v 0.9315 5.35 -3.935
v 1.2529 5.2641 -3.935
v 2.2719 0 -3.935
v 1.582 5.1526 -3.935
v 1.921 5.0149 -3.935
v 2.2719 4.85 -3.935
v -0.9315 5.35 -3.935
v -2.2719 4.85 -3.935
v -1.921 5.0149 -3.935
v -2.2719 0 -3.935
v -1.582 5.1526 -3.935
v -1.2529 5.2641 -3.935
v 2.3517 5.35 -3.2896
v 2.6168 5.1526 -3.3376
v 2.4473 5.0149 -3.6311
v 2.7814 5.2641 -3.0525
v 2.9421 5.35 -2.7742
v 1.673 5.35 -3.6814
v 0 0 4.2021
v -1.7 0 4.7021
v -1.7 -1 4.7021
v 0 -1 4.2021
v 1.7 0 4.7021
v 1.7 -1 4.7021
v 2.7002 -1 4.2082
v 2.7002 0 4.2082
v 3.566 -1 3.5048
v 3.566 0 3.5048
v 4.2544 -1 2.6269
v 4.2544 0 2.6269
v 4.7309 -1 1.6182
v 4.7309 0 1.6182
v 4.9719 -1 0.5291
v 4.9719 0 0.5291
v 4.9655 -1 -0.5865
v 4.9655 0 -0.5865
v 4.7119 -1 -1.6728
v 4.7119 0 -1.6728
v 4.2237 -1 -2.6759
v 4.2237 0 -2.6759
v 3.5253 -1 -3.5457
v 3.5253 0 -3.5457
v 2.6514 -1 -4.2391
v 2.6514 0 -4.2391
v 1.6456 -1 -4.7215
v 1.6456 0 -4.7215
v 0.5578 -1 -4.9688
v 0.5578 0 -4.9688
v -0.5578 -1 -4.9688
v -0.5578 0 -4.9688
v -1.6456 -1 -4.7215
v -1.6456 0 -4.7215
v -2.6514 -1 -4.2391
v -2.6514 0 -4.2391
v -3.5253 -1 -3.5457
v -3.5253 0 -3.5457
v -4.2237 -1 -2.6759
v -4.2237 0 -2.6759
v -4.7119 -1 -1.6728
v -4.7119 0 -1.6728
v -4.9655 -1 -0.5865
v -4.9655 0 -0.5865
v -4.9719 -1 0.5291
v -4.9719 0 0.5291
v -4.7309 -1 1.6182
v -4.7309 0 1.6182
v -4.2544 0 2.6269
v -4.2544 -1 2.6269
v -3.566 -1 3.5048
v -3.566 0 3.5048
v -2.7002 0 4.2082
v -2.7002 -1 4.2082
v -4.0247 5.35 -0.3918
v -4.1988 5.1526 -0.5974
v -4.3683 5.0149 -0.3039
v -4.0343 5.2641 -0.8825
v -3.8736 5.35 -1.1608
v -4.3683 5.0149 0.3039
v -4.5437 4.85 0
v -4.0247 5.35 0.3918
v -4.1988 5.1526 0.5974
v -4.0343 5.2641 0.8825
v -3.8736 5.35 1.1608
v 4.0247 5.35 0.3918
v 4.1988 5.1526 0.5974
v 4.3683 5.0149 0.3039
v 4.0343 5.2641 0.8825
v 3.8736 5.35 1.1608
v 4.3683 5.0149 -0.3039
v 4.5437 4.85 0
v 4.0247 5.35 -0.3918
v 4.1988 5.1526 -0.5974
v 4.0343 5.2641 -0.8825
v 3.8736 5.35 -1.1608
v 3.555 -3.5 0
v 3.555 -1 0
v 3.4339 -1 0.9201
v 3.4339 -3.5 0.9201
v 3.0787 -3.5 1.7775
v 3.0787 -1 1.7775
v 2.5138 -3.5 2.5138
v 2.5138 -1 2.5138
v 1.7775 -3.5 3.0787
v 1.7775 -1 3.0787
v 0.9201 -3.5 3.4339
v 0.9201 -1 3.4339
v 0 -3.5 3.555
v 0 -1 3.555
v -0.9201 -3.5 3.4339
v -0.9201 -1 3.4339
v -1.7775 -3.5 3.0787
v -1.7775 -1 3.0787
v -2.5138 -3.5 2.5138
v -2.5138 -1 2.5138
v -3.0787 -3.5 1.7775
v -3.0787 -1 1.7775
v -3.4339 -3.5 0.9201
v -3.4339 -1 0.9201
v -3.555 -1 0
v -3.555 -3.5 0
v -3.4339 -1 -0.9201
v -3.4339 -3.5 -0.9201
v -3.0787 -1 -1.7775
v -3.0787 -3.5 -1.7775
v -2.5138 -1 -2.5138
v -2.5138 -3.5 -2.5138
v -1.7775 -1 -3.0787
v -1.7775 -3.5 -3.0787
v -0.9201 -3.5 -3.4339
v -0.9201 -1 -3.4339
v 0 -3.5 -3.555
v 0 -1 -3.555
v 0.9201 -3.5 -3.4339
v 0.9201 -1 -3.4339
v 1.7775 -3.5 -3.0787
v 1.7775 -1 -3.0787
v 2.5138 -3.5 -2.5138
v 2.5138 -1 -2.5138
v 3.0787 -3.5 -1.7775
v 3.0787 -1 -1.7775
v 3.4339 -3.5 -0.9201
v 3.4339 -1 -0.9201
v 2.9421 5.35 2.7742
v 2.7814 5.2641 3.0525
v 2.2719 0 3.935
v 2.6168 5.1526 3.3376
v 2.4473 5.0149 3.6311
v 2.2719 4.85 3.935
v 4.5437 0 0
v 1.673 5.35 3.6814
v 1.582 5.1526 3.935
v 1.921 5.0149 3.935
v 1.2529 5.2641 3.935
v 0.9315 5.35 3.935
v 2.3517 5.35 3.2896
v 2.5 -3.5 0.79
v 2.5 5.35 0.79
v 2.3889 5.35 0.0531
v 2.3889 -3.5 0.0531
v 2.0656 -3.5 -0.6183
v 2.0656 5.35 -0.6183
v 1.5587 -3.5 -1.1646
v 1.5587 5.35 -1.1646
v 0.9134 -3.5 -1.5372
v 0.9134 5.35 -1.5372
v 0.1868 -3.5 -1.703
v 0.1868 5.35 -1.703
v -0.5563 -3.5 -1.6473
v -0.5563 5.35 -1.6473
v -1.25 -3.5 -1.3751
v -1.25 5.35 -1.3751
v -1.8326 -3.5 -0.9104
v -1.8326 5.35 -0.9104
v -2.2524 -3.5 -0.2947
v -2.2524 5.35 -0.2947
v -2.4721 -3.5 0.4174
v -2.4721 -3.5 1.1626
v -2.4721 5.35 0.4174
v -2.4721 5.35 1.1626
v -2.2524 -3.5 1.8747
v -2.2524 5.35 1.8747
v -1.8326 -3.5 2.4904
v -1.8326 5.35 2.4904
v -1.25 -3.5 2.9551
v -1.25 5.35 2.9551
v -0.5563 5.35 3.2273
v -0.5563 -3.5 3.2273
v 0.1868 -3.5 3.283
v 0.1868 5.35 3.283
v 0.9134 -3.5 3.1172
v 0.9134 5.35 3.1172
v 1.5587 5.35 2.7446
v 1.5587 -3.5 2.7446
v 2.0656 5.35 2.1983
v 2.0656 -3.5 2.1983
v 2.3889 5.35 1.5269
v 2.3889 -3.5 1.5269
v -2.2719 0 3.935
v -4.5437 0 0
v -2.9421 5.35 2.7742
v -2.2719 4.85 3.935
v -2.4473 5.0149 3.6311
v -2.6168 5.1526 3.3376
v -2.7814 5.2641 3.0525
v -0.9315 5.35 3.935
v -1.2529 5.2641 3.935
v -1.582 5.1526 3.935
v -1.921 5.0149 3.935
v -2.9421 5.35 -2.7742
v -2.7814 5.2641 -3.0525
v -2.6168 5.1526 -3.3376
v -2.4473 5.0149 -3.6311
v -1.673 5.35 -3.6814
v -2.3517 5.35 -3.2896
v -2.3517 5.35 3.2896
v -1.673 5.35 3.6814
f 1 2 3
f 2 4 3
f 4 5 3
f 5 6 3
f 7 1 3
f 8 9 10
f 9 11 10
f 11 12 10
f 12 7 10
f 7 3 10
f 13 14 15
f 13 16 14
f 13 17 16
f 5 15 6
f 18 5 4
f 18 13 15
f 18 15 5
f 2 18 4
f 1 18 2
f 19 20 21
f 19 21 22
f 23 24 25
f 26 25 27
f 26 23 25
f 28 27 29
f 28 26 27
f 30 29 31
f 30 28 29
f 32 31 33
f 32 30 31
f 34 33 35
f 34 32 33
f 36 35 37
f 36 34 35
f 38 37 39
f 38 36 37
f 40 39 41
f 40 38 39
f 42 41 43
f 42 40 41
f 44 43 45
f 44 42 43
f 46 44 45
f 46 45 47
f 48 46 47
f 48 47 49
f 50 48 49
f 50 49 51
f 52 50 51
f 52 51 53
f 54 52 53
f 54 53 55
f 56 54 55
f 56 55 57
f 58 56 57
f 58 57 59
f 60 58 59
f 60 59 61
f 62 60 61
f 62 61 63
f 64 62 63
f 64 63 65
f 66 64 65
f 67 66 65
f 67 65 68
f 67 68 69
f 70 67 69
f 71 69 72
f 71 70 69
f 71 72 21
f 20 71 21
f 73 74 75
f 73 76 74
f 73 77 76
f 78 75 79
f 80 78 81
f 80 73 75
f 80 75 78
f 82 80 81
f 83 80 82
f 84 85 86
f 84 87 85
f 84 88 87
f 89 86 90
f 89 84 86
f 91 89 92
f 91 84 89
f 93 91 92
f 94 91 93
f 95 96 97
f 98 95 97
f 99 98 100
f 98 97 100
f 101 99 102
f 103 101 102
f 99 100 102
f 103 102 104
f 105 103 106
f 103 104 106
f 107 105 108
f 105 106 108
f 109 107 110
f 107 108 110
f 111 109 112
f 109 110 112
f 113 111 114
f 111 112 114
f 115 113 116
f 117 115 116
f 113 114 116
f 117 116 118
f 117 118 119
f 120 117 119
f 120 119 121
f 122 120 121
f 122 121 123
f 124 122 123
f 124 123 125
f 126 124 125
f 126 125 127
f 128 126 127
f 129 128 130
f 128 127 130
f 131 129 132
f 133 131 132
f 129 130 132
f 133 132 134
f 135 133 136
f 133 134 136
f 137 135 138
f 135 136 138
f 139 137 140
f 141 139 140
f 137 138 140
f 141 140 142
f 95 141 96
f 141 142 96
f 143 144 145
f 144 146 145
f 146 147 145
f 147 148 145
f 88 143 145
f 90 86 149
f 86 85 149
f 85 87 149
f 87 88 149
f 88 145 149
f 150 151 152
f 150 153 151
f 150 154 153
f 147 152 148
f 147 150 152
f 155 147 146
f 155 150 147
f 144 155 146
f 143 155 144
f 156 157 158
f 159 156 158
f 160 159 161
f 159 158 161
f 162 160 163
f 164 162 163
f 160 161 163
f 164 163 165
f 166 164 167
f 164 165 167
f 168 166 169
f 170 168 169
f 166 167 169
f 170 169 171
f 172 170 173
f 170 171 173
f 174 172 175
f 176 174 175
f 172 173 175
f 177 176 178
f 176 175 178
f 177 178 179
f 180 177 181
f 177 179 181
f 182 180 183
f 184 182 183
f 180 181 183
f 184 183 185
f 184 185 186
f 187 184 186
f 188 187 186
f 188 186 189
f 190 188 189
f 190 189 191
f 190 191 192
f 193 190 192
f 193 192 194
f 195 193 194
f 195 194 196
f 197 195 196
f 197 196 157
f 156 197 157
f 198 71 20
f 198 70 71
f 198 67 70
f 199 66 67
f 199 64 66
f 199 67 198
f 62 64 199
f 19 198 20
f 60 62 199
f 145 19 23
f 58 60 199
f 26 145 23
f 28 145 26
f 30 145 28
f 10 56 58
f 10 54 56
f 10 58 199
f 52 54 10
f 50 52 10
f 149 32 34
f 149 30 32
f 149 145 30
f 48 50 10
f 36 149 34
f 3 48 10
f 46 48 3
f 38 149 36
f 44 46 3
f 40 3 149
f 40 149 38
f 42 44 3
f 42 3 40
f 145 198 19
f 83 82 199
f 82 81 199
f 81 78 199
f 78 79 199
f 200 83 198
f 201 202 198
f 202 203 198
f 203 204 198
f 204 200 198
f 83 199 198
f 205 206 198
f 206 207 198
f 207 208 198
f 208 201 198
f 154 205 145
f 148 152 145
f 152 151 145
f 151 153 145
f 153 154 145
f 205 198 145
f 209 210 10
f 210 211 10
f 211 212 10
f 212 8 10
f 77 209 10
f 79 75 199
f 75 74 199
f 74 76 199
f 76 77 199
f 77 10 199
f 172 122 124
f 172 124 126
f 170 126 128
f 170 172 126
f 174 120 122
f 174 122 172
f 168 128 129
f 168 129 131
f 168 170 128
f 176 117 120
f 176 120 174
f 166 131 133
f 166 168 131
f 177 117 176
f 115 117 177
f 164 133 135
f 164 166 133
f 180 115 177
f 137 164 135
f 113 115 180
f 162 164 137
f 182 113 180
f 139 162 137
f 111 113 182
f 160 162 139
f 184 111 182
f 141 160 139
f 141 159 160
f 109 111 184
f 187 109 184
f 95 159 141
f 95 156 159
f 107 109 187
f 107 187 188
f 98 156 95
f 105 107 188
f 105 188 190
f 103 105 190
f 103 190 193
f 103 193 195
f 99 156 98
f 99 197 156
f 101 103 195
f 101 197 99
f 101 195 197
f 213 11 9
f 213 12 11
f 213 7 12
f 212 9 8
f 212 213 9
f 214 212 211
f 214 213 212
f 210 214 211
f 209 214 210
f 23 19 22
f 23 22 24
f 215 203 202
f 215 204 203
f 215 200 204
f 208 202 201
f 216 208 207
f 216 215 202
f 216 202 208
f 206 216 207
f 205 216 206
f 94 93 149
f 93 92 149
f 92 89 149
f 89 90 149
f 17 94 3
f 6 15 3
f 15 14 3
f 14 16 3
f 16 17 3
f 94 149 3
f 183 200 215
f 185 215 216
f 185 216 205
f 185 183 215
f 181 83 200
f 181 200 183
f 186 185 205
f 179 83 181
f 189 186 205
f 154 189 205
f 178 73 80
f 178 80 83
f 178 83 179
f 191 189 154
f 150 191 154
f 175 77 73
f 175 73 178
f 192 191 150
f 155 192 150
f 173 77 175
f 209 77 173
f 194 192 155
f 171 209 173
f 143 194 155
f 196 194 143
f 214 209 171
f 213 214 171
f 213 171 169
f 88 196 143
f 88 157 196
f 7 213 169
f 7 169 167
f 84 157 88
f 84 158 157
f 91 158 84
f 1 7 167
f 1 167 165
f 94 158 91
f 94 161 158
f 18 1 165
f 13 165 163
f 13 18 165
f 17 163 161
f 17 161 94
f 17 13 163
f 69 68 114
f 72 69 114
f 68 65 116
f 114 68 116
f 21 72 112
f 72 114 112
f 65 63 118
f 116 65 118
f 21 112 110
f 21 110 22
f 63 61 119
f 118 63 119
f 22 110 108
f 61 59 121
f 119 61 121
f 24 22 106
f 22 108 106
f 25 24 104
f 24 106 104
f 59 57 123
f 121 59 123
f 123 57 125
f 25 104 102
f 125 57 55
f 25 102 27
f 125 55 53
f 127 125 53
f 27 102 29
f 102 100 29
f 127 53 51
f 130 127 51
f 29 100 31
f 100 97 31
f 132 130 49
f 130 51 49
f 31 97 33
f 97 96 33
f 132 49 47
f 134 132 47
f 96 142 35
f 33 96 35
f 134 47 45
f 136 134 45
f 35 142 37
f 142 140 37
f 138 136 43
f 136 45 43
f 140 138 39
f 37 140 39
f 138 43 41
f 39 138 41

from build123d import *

# Parameters (mm, degrees)
BOSS_EXTRUDE1_DEPTH = 5.35
SKETCH2_R           = 5
BOSS_EXTRUDE2_DEPTH = 1
SKETCH3_R           = 3.555
BOSS_EXTRUDE3_DEPTH = 2.5
SKETCH4_R           = 2.5
CUT_EXTRUDE1_DEPTH  = 9.85
CUT_EXTRUDE2_DEPTH  = 4.5


with BuildPart() as part:
    # Sketch1 → Boss-Extrude1 (new body)
    with BuildSketch(Plane(origin=(0, 0, 0), x_dir=(1, 0, 0), z_dir=(0, 1, 0))):
        Polygon((4.543746619, 0), (2.271873309, 3.935), (-2.271873309, 3.935), (-4.543746619, 0), (-2.271873309, -3.935), (2.271873309, -3.935), align=None)
    extrude(amount=BOSS_EXTRUDE1_DEPTH)

    # Sketch2 → Boss-Extrude2 (add)
    with BuildSketch(Plane(origin=(0, 0, 0), x_dir=(1, 0, 0), z_dir=(0, 1, 0))):
        Circle(SKETCH2_R)
    extrude(amount=-BOSS_EXTRUDE2_DEPTH)

    # Sketch3 → Boss-Extrude3 (add)
    with BuildSketch(Plane.XZ.offset(1)):
        Circle(SKETCH3_R)
    extrude(amount=BOSS_EXTRUDE3_DEPTH)

    # Sketch4 → Cut-Extrude1 (cut, through all)
    with BuildSketch(Plane(origin=(0, 5.35, 0), x_dir=(1, 0, 0), z_dir=(0, 1, 0))):
        with Locations((0, -0.79)):
            Circle(SKETCH4_R)
    extrude(amount=-CUT_EXTRUDE1_DEPTH, mode=Mode.SUBTRACT)

    # Sketch5 → Cut-Extrude2 (cut, through all)
    with BuildSketch(Plane(origin=(0, 0, 0), x_dir=(1, 0, 0), z_dir=(0, 1, 0))):
        with BuildLine():
            Line((-1.7, -4.702127178), (0, -4.202127178))
            Line((0, -4.202127178), (1.7, -4.702127178))
            ThreePointArc((1.7, -4.702127178), (0, -5), (-1.7, -4.702127178))
        make_face()
    extrude(amount=-CUT_EXTRUDE2_DEPTH, mode=Mode.SUBTRACT)

    # Sketch6 → Cut-Revolve1 (revolve, cut)
    with BuildSketch(Plane.XY):
        Polygon((4.043746619, 5.35), (4.543746619, 5.35), (4.543746619, 4.85), align=None)
    revolve(axis=Axis((0, 0, 0), (0, 1, 0)), mode=Mode.SUBTRACT)


solid = part.part
